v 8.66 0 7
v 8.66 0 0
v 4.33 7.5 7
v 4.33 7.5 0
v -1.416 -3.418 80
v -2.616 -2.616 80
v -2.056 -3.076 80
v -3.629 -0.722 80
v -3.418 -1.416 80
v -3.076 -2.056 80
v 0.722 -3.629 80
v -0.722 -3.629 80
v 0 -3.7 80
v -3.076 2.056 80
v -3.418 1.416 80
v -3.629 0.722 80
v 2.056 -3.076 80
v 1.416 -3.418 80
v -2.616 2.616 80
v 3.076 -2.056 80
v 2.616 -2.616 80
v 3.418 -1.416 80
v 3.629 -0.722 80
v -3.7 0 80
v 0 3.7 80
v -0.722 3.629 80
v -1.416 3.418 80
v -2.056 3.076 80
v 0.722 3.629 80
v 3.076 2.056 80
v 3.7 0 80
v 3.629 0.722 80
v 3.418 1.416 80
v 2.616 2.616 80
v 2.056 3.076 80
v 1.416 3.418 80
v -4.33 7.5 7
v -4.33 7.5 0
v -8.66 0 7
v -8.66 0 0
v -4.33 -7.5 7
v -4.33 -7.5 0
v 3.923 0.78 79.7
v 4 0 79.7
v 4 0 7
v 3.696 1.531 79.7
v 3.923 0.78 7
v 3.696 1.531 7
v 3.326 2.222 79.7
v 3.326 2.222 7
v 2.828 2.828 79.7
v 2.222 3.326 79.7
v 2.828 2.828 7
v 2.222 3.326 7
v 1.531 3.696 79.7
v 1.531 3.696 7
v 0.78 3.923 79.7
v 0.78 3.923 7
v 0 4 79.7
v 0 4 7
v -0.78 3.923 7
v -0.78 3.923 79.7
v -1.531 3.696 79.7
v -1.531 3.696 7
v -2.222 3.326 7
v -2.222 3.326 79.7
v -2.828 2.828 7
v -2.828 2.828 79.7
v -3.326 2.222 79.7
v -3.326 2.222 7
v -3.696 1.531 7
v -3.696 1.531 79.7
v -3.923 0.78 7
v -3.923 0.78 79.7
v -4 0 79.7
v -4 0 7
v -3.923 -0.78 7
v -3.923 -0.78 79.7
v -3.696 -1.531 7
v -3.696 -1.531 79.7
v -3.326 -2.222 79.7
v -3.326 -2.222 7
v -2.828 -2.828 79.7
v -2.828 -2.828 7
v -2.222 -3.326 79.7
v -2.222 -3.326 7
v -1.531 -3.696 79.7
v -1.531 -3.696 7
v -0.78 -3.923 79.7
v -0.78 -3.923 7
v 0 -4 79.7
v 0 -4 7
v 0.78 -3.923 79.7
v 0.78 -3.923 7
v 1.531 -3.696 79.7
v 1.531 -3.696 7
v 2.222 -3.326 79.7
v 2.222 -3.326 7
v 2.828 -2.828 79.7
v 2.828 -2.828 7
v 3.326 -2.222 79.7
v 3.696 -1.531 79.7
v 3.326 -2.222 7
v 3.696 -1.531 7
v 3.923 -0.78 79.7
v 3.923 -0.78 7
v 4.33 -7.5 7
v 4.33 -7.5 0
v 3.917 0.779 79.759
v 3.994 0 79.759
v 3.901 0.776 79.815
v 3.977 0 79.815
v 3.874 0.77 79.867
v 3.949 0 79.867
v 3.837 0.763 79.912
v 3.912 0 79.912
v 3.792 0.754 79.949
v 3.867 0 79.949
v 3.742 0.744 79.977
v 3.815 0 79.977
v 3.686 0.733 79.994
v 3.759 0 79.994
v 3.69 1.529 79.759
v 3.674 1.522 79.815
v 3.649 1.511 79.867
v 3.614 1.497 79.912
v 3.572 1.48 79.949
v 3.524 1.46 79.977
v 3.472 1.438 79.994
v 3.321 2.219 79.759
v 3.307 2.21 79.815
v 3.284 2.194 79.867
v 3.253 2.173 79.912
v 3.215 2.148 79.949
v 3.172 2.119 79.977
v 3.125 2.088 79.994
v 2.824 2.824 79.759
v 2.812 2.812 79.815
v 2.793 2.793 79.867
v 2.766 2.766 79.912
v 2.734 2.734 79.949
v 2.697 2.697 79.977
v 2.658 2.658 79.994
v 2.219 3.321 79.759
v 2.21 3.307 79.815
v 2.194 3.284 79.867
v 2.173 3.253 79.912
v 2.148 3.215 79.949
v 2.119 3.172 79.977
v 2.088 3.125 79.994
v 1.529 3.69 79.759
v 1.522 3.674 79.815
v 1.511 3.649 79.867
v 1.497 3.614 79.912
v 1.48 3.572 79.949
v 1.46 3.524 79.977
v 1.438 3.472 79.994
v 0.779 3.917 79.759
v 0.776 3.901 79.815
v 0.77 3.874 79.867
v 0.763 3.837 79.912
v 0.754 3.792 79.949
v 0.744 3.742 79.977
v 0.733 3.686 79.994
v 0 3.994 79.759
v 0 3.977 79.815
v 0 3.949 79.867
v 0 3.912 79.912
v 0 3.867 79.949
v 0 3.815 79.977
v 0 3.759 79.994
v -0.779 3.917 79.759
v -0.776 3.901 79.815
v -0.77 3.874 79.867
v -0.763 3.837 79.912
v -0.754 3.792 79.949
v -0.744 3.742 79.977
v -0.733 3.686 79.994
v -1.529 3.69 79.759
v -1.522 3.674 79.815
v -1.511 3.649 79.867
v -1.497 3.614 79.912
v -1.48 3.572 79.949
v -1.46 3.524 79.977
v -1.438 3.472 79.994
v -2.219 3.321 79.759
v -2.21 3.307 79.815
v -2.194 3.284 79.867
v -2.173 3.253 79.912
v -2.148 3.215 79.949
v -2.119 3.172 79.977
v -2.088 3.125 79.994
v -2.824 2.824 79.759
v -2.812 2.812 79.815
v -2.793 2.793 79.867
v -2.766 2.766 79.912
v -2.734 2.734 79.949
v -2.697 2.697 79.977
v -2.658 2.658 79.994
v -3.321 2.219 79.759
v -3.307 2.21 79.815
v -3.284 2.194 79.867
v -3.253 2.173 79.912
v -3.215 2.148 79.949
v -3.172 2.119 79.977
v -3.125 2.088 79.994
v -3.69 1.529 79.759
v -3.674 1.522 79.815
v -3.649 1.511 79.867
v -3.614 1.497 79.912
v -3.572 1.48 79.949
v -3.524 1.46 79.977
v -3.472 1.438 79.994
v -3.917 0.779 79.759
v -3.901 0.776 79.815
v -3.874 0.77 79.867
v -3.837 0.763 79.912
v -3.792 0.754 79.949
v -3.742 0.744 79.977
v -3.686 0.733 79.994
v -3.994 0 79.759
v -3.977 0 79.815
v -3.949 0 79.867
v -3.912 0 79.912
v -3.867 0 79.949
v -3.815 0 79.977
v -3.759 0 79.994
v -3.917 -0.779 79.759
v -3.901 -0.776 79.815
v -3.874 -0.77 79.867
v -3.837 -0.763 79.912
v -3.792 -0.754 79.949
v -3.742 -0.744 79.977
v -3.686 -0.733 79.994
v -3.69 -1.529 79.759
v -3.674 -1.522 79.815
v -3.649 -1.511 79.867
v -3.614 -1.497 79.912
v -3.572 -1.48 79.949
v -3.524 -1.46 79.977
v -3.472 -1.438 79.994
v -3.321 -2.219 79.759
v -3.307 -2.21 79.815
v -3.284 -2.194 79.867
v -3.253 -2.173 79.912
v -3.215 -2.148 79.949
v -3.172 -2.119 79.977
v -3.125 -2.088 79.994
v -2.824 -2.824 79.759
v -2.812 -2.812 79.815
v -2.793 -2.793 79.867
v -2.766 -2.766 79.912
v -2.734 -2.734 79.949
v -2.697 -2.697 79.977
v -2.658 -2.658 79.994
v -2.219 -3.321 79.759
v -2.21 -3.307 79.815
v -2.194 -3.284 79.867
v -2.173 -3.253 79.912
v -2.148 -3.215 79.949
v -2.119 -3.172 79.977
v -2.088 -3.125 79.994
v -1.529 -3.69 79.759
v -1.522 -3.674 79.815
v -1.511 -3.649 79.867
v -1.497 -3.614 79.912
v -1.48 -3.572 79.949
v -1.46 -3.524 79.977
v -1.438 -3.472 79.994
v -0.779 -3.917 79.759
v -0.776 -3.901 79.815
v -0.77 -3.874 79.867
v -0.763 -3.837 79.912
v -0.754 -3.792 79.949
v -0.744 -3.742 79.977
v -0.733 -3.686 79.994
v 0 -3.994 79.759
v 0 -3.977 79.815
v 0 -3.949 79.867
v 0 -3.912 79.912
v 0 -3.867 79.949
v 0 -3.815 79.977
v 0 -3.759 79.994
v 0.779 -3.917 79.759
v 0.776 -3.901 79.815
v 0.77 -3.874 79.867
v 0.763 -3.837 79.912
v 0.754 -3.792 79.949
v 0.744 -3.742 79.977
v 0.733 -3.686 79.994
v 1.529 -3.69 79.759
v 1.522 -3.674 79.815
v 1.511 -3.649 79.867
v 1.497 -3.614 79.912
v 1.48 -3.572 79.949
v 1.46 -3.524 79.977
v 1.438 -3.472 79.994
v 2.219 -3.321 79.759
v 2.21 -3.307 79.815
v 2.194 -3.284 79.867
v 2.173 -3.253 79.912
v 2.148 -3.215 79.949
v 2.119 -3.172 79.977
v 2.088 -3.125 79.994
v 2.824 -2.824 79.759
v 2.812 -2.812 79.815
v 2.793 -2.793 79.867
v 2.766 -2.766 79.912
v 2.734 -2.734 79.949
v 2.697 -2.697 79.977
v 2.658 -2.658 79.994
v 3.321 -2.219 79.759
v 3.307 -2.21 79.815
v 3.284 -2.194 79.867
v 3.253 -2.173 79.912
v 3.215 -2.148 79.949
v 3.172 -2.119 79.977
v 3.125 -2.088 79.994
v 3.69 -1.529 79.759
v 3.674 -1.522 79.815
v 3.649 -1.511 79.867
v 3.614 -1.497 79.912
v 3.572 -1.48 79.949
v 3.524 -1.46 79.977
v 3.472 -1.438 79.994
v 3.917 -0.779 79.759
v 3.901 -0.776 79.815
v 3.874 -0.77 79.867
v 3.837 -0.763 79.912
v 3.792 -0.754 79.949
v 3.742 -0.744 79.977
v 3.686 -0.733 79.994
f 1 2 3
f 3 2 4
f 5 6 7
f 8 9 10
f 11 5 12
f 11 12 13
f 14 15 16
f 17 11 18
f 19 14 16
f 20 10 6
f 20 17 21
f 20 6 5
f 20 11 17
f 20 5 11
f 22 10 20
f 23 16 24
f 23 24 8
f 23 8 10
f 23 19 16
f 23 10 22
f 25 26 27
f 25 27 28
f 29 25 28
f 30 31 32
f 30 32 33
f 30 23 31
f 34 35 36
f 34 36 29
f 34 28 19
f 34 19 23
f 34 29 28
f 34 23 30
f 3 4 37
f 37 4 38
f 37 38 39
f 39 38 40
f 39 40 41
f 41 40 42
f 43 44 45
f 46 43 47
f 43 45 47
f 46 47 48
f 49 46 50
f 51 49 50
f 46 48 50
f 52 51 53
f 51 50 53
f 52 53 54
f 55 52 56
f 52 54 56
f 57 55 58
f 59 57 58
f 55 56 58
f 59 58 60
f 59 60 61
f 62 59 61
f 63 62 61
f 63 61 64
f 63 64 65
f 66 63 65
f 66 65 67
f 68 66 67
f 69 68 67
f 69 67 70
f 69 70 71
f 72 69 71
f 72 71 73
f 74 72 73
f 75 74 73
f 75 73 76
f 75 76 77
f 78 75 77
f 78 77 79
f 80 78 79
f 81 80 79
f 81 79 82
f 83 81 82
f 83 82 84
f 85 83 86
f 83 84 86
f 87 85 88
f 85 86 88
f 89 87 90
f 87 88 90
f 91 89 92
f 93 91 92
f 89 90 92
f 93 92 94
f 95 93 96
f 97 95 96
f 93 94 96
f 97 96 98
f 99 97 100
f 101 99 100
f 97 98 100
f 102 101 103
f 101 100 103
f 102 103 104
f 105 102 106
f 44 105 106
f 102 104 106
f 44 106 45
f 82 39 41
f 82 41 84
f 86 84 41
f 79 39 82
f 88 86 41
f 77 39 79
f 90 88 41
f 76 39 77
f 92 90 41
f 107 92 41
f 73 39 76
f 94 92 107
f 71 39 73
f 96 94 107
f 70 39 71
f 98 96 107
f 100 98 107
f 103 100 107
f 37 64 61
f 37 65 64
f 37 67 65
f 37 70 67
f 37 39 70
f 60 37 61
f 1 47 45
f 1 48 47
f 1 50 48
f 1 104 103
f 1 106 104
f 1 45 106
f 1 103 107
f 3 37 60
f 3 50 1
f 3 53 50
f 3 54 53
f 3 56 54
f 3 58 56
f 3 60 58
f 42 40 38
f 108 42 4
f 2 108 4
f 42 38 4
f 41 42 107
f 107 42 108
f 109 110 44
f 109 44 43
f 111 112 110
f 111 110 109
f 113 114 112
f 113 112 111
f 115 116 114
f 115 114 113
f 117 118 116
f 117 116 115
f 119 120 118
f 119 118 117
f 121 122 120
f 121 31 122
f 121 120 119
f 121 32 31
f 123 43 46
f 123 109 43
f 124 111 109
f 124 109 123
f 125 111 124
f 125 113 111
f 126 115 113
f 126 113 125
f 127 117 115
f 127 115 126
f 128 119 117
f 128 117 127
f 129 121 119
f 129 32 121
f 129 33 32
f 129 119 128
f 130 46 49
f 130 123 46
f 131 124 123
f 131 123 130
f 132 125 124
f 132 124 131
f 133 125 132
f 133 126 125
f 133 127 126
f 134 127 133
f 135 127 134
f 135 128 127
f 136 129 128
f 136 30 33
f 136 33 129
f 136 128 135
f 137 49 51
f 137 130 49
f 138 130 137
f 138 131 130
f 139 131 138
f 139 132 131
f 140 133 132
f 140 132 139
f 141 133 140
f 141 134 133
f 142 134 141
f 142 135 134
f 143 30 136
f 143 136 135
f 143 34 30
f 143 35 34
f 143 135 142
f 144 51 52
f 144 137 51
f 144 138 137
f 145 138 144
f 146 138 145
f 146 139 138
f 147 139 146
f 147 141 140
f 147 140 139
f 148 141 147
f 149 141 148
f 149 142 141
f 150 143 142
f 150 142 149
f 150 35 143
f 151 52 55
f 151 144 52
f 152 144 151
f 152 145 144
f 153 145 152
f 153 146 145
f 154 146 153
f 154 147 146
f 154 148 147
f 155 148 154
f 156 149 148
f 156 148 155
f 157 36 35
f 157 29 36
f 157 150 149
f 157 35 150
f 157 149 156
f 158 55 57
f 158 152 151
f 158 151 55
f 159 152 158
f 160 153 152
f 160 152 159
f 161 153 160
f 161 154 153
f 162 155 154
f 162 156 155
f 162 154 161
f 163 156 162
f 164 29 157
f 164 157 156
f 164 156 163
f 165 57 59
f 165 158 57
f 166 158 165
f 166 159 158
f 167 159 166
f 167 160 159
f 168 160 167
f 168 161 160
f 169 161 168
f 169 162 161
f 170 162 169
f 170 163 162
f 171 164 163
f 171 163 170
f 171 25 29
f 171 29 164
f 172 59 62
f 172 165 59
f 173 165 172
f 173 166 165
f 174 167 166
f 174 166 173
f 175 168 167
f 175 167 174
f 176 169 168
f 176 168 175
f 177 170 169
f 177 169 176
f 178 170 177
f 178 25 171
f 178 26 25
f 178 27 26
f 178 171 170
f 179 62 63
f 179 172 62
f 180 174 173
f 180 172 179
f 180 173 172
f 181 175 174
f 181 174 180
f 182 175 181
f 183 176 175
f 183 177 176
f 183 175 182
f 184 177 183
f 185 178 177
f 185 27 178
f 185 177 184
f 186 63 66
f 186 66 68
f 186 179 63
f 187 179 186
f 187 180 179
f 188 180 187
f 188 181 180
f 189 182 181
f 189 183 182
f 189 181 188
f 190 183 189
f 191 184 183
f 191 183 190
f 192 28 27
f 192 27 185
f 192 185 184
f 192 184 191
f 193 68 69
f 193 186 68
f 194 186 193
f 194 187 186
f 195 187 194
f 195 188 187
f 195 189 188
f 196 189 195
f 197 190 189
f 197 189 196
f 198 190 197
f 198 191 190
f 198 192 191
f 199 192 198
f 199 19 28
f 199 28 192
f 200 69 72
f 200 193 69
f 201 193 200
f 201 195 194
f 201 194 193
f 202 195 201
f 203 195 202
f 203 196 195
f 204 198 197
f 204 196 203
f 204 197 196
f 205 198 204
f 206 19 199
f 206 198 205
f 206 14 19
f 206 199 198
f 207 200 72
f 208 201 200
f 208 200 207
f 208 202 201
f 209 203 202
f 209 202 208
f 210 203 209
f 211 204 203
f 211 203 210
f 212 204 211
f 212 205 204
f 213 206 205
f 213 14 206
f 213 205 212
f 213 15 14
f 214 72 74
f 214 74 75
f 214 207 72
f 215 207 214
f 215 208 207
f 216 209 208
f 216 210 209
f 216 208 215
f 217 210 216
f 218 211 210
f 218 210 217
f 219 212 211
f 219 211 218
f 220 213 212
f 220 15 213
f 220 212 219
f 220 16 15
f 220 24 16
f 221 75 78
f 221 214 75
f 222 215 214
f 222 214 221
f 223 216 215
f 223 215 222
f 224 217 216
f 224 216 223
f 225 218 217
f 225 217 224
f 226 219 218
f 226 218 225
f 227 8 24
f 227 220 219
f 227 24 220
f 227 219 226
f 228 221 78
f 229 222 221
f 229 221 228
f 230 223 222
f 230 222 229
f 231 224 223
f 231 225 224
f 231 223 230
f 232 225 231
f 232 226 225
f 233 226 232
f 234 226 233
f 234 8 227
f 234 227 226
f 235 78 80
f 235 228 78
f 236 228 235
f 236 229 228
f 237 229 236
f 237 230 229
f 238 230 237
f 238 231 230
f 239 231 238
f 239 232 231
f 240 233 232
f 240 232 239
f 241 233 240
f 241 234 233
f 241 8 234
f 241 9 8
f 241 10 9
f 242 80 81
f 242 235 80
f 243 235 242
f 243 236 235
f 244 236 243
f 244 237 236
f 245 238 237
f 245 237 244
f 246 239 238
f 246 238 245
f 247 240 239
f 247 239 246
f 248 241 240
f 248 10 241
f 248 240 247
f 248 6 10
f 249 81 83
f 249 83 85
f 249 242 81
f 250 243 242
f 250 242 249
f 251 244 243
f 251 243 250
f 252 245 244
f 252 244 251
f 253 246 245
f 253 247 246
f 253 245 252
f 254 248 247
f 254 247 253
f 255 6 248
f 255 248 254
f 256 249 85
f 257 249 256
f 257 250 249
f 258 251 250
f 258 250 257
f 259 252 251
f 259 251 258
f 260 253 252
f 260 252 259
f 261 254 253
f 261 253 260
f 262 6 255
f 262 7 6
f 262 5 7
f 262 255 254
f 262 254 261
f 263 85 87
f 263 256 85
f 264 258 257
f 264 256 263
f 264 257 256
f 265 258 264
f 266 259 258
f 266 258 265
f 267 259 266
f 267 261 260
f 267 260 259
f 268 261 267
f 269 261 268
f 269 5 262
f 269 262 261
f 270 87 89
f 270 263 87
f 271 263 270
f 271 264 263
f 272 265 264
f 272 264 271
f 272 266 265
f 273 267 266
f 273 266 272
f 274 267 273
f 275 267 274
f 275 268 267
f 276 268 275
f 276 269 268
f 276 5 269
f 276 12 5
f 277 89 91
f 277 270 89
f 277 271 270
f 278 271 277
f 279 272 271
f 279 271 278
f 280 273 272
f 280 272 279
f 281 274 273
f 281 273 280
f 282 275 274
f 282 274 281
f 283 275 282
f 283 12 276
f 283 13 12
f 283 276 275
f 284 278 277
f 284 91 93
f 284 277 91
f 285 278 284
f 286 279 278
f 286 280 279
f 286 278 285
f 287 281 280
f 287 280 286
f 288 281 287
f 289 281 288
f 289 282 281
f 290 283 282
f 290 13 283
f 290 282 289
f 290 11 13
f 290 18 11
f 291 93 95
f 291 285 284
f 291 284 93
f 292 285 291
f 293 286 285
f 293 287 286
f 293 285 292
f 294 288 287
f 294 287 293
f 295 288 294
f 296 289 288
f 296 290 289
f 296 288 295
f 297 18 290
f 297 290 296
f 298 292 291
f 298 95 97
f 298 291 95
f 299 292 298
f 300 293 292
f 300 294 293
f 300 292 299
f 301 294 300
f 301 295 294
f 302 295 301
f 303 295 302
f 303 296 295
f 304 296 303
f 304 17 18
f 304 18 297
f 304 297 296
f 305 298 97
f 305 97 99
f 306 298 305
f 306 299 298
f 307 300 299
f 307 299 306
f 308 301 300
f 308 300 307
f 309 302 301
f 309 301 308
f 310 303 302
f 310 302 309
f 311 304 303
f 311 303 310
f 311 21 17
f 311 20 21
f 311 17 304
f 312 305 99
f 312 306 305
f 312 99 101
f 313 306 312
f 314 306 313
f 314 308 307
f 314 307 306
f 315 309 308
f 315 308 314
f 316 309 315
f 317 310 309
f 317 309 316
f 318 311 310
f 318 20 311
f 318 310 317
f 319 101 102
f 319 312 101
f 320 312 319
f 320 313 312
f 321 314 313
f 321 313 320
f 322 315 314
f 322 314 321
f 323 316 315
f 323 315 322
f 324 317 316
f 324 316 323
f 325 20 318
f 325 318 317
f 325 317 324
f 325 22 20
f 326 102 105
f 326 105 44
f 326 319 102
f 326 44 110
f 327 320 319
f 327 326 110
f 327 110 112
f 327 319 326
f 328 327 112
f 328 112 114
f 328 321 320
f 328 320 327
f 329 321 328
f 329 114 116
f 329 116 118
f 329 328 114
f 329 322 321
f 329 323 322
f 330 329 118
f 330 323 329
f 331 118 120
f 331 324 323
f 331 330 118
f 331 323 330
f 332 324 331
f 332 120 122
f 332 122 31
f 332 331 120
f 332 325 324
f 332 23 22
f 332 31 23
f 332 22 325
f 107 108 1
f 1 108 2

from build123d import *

# Parameters (mm, degrees)
CROQUIS1_R              = 4
SALIENTE_EXTRUIR1_DEPTH = 80
CROQUIS1_3_R            = 4
SALIENTE_EXTRUIR2_DEPTH = 7
REDONDEO1_R             = 0.3


with BuildPart() as part:
    # Croquis1 → Saliente-Extruir1 (new body)
    with BuildSketch(Plane.XY):
        Circle(CROQUIS1_R)
    extrude(amount=SALIENTE_EXTRUIR1_DEPTH)

    # Croquis1<3> → Saliente-Extruir2 (add)
    with BuildSketch(Plane.XY):
        Polygon((-4.330127019, -7.5), (4.330127019, -7.5), (8.660254038, 0), (4.330127019, 7.5), (-4.330127019, 7.5), (-8.660254038, 0), align=None)
        Circle(CROQUIS1_3_R, mode=Mode.SUBTRACT)
    extrude(amount=SALIENTE_EXTRUIR2_DEPTH)

    # Redondeo1
    redondeo1_edges = [part.edges().sort_by_distance(p)[0] for p in [
        (-4, 0, 80),
    ]]
    fillet(redondeo1_edges, radius=REDONDEO1_R)


solid = part.part
